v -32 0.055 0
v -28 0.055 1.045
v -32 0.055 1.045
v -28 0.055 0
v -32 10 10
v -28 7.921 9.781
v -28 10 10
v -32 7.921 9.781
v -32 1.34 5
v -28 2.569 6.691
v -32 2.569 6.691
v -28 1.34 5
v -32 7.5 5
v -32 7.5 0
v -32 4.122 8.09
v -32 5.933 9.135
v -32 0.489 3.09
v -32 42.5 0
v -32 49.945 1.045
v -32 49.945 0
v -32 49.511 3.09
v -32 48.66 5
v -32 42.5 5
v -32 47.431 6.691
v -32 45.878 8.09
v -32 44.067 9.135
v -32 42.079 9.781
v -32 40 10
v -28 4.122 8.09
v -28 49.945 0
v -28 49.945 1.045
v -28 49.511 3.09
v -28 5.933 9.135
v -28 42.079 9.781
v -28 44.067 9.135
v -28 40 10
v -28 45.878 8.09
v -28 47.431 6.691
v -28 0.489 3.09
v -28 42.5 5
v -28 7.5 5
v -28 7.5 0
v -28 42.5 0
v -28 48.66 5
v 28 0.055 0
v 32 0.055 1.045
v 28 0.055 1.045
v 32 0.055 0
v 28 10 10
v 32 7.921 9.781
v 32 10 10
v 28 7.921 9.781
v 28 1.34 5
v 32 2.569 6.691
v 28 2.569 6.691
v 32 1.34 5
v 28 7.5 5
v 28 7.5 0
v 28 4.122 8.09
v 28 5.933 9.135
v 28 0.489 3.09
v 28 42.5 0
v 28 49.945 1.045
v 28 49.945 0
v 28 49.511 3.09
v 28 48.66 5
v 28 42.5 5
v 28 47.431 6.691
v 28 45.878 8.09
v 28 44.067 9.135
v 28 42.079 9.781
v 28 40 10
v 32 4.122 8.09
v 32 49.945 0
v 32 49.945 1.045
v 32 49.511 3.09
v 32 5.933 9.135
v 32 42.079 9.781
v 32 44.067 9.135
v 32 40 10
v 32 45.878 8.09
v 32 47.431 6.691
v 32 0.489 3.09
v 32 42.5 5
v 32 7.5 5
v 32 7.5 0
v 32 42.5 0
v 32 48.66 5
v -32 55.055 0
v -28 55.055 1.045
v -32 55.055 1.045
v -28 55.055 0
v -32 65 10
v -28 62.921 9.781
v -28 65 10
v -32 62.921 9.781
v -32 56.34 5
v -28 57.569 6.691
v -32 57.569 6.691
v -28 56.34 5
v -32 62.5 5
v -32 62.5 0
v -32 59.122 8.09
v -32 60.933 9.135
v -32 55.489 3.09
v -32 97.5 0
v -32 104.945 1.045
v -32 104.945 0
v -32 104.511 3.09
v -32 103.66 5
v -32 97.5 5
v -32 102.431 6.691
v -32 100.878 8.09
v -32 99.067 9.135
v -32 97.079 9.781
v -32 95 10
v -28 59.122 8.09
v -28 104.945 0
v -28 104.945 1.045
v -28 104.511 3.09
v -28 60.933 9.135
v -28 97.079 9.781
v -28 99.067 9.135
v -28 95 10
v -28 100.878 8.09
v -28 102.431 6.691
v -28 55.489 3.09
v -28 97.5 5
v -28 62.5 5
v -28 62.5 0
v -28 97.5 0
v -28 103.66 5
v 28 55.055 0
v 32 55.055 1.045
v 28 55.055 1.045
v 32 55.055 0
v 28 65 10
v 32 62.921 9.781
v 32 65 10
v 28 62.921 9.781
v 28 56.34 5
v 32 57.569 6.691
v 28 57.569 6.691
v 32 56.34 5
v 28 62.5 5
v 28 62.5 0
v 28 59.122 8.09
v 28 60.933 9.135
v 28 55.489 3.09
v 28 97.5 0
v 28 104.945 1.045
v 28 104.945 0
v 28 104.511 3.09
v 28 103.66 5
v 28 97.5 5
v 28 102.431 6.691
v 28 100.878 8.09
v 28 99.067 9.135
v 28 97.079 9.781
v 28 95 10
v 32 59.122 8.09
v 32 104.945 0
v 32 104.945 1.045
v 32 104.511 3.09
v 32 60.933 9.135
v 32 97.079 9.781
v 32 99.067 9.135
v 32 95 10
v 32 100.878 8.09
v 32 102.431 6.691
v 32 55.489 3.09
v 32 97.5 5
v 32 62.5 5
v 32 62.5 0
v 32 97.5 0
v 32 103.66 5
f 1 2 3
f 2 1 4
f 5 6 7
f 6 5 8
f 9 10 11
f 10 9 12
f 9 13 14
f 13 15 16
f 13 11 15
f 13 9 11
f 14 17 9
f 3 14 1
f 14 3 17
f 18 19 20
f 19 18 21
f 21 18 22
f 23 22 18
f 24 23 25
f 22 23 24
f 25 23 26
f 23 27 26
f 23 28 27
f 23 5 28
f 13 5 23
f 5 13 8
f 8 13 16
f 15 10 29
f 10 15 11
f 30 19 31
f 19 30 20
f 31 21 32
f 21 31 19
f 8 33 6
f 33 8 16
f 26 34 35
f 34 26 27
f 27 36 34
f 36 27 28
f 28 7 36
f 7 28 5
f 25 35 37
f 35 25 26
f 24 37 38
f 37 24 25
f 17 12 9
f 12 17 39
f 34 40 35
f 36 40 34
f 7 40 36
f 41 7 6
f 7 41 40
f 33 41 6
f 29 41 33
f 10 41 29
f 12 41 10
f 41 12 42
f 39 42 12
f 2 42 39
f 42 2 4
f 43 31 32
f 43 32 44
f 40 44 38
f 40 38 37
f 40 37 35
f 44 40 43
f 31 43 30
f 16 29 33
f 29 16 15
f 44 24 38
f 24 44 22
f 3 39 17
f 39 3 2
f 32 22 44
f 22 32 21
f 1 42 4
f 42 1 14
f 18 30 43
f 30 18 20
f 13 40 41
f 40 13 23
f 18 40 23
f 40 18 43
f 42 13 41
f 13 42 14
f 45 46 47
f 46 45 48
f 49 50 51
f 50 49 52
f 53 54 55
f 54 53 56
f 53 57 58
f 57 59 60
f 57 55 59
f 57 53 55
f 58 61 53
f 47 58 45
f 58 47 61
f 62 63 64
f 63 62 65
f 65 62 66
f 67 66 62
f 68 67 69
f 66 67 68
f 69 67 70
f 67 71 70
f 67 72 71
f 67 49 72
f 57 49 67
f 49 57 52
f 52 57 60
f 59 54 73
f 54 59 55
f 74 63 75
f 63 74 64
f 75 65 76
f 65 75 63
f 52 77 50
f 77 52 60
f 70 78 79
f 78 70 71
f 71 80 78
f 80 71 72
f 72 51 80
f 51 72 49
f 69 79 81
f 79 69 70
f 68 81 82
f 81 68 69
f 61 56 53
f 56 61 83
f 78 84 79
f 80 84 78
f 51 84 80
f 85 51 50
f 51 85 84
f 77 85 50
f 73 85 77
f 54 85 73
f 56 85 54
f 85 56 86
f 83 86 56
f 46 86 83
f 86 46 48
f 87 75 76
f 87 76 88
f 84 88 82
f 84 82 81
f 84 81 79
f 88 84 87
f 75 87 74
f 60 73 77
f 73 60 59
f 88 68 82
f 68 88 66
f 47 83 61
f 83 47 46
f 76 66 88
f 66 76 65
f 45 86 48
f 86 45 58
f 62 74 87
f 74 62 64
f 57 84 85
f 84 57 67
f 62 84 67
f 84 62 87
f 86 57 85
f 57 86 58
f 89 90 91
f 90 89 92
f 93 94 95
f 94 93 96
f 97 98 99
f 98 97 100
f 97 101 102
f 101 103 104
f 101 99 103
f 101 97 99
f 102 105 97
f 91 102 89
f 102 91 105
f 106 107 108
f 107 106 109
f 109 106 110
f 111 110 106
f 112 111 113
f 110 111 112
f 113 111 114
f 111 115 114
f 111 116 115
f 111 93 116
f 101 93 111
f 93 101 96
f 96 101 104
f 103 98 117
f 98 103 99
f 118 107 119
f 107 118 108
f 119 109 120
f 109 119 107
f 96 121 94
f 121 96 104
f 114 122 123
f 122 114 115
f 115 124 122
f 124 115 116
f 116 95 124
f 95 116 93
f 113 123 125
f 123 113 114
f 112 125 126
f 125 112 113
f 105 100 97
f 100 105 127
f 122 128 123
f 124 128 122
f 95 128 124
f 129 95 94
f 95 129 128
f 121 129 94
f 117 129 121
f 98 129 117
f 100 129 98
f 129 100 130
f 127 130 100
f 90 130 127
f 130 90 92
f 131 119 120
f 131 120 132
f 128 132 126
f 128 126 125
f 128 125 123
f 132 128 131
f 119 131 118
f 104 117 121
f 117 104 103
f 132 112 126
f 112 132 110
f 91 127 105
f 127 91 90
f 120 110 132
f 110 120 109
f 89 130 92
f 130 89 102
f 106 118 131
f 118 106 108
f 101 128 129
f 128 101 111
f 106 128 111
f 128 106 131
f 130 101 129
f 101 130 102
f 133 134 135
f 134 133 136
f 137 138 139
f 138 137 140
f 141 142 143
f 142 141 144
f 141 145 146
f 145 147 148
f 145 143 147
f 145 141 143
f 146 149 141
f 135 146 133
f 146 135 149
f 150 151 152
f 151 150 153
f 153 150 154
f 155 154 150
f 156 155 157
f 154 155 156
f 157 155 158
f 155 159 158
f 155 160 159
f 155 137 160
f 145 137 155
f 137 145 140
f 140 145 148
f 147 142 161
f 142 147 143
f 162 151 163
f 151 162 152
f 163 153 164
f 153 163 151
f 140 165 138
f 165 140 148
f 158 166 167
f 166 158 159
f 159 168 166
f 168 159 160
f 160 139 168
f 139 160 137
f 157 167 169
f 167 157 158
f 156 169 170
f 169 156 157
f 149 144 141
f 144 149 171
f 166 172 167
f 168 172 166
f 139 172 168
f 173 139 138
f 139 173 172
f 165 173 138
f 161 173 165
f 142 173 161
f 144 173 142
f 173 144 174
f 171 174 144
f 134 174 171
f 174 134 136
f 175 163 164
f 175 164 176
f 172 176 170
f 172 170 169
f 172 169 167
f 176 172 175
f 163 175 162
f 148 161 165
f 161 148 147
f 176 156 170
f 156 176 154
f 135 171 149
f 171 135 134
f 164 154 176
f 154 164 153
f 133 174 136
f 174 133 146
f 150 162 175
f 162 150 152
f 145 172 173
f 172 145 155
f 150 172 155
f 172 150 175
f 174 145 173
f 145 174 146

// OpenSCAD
eps = 0.01;

module battery_pack_mock()
{
  size = [50, 100, 50];
  translate([-size.x/2, 0, 0])
    cube(size);
}

module battery_pack_holder()
{
  size = [4, 30, 10];
  velcro_slot = [size.x+2*eps, 35, 5];
  module mount_side()
  {
    module body()
    {
      translate([0, size.z, 0])
        intersection()
        {
          hull()
            for(dy=[0, size.y])
              translate([-size.x/2, dy, 0])
                rotate([0, 90, 0])
                  cylinder(r=size.z, h=size.x);
          translate(-2*[size.x, size.y, 0])
            cube(4*size);
        }
    }

    module slot(dh)
    {
      vs = velcro_slot;
      translate([0, (size.y+2*size.z)/2, -dh])
        translate(-0.5*[vs.x, vs.y, 0])
          cube(vs + [0, 0, dh]);
    }

    difference()
    {
      body();
      slot(dh=eps);
    }
  }

  for(dy=[0, 55])
    for(dir=[-1,+1])
      translate([dir*(50+10)/2, dy, 0])
        mount_side();

  %battery_pack_mock();
}

battery_pack_holder();
